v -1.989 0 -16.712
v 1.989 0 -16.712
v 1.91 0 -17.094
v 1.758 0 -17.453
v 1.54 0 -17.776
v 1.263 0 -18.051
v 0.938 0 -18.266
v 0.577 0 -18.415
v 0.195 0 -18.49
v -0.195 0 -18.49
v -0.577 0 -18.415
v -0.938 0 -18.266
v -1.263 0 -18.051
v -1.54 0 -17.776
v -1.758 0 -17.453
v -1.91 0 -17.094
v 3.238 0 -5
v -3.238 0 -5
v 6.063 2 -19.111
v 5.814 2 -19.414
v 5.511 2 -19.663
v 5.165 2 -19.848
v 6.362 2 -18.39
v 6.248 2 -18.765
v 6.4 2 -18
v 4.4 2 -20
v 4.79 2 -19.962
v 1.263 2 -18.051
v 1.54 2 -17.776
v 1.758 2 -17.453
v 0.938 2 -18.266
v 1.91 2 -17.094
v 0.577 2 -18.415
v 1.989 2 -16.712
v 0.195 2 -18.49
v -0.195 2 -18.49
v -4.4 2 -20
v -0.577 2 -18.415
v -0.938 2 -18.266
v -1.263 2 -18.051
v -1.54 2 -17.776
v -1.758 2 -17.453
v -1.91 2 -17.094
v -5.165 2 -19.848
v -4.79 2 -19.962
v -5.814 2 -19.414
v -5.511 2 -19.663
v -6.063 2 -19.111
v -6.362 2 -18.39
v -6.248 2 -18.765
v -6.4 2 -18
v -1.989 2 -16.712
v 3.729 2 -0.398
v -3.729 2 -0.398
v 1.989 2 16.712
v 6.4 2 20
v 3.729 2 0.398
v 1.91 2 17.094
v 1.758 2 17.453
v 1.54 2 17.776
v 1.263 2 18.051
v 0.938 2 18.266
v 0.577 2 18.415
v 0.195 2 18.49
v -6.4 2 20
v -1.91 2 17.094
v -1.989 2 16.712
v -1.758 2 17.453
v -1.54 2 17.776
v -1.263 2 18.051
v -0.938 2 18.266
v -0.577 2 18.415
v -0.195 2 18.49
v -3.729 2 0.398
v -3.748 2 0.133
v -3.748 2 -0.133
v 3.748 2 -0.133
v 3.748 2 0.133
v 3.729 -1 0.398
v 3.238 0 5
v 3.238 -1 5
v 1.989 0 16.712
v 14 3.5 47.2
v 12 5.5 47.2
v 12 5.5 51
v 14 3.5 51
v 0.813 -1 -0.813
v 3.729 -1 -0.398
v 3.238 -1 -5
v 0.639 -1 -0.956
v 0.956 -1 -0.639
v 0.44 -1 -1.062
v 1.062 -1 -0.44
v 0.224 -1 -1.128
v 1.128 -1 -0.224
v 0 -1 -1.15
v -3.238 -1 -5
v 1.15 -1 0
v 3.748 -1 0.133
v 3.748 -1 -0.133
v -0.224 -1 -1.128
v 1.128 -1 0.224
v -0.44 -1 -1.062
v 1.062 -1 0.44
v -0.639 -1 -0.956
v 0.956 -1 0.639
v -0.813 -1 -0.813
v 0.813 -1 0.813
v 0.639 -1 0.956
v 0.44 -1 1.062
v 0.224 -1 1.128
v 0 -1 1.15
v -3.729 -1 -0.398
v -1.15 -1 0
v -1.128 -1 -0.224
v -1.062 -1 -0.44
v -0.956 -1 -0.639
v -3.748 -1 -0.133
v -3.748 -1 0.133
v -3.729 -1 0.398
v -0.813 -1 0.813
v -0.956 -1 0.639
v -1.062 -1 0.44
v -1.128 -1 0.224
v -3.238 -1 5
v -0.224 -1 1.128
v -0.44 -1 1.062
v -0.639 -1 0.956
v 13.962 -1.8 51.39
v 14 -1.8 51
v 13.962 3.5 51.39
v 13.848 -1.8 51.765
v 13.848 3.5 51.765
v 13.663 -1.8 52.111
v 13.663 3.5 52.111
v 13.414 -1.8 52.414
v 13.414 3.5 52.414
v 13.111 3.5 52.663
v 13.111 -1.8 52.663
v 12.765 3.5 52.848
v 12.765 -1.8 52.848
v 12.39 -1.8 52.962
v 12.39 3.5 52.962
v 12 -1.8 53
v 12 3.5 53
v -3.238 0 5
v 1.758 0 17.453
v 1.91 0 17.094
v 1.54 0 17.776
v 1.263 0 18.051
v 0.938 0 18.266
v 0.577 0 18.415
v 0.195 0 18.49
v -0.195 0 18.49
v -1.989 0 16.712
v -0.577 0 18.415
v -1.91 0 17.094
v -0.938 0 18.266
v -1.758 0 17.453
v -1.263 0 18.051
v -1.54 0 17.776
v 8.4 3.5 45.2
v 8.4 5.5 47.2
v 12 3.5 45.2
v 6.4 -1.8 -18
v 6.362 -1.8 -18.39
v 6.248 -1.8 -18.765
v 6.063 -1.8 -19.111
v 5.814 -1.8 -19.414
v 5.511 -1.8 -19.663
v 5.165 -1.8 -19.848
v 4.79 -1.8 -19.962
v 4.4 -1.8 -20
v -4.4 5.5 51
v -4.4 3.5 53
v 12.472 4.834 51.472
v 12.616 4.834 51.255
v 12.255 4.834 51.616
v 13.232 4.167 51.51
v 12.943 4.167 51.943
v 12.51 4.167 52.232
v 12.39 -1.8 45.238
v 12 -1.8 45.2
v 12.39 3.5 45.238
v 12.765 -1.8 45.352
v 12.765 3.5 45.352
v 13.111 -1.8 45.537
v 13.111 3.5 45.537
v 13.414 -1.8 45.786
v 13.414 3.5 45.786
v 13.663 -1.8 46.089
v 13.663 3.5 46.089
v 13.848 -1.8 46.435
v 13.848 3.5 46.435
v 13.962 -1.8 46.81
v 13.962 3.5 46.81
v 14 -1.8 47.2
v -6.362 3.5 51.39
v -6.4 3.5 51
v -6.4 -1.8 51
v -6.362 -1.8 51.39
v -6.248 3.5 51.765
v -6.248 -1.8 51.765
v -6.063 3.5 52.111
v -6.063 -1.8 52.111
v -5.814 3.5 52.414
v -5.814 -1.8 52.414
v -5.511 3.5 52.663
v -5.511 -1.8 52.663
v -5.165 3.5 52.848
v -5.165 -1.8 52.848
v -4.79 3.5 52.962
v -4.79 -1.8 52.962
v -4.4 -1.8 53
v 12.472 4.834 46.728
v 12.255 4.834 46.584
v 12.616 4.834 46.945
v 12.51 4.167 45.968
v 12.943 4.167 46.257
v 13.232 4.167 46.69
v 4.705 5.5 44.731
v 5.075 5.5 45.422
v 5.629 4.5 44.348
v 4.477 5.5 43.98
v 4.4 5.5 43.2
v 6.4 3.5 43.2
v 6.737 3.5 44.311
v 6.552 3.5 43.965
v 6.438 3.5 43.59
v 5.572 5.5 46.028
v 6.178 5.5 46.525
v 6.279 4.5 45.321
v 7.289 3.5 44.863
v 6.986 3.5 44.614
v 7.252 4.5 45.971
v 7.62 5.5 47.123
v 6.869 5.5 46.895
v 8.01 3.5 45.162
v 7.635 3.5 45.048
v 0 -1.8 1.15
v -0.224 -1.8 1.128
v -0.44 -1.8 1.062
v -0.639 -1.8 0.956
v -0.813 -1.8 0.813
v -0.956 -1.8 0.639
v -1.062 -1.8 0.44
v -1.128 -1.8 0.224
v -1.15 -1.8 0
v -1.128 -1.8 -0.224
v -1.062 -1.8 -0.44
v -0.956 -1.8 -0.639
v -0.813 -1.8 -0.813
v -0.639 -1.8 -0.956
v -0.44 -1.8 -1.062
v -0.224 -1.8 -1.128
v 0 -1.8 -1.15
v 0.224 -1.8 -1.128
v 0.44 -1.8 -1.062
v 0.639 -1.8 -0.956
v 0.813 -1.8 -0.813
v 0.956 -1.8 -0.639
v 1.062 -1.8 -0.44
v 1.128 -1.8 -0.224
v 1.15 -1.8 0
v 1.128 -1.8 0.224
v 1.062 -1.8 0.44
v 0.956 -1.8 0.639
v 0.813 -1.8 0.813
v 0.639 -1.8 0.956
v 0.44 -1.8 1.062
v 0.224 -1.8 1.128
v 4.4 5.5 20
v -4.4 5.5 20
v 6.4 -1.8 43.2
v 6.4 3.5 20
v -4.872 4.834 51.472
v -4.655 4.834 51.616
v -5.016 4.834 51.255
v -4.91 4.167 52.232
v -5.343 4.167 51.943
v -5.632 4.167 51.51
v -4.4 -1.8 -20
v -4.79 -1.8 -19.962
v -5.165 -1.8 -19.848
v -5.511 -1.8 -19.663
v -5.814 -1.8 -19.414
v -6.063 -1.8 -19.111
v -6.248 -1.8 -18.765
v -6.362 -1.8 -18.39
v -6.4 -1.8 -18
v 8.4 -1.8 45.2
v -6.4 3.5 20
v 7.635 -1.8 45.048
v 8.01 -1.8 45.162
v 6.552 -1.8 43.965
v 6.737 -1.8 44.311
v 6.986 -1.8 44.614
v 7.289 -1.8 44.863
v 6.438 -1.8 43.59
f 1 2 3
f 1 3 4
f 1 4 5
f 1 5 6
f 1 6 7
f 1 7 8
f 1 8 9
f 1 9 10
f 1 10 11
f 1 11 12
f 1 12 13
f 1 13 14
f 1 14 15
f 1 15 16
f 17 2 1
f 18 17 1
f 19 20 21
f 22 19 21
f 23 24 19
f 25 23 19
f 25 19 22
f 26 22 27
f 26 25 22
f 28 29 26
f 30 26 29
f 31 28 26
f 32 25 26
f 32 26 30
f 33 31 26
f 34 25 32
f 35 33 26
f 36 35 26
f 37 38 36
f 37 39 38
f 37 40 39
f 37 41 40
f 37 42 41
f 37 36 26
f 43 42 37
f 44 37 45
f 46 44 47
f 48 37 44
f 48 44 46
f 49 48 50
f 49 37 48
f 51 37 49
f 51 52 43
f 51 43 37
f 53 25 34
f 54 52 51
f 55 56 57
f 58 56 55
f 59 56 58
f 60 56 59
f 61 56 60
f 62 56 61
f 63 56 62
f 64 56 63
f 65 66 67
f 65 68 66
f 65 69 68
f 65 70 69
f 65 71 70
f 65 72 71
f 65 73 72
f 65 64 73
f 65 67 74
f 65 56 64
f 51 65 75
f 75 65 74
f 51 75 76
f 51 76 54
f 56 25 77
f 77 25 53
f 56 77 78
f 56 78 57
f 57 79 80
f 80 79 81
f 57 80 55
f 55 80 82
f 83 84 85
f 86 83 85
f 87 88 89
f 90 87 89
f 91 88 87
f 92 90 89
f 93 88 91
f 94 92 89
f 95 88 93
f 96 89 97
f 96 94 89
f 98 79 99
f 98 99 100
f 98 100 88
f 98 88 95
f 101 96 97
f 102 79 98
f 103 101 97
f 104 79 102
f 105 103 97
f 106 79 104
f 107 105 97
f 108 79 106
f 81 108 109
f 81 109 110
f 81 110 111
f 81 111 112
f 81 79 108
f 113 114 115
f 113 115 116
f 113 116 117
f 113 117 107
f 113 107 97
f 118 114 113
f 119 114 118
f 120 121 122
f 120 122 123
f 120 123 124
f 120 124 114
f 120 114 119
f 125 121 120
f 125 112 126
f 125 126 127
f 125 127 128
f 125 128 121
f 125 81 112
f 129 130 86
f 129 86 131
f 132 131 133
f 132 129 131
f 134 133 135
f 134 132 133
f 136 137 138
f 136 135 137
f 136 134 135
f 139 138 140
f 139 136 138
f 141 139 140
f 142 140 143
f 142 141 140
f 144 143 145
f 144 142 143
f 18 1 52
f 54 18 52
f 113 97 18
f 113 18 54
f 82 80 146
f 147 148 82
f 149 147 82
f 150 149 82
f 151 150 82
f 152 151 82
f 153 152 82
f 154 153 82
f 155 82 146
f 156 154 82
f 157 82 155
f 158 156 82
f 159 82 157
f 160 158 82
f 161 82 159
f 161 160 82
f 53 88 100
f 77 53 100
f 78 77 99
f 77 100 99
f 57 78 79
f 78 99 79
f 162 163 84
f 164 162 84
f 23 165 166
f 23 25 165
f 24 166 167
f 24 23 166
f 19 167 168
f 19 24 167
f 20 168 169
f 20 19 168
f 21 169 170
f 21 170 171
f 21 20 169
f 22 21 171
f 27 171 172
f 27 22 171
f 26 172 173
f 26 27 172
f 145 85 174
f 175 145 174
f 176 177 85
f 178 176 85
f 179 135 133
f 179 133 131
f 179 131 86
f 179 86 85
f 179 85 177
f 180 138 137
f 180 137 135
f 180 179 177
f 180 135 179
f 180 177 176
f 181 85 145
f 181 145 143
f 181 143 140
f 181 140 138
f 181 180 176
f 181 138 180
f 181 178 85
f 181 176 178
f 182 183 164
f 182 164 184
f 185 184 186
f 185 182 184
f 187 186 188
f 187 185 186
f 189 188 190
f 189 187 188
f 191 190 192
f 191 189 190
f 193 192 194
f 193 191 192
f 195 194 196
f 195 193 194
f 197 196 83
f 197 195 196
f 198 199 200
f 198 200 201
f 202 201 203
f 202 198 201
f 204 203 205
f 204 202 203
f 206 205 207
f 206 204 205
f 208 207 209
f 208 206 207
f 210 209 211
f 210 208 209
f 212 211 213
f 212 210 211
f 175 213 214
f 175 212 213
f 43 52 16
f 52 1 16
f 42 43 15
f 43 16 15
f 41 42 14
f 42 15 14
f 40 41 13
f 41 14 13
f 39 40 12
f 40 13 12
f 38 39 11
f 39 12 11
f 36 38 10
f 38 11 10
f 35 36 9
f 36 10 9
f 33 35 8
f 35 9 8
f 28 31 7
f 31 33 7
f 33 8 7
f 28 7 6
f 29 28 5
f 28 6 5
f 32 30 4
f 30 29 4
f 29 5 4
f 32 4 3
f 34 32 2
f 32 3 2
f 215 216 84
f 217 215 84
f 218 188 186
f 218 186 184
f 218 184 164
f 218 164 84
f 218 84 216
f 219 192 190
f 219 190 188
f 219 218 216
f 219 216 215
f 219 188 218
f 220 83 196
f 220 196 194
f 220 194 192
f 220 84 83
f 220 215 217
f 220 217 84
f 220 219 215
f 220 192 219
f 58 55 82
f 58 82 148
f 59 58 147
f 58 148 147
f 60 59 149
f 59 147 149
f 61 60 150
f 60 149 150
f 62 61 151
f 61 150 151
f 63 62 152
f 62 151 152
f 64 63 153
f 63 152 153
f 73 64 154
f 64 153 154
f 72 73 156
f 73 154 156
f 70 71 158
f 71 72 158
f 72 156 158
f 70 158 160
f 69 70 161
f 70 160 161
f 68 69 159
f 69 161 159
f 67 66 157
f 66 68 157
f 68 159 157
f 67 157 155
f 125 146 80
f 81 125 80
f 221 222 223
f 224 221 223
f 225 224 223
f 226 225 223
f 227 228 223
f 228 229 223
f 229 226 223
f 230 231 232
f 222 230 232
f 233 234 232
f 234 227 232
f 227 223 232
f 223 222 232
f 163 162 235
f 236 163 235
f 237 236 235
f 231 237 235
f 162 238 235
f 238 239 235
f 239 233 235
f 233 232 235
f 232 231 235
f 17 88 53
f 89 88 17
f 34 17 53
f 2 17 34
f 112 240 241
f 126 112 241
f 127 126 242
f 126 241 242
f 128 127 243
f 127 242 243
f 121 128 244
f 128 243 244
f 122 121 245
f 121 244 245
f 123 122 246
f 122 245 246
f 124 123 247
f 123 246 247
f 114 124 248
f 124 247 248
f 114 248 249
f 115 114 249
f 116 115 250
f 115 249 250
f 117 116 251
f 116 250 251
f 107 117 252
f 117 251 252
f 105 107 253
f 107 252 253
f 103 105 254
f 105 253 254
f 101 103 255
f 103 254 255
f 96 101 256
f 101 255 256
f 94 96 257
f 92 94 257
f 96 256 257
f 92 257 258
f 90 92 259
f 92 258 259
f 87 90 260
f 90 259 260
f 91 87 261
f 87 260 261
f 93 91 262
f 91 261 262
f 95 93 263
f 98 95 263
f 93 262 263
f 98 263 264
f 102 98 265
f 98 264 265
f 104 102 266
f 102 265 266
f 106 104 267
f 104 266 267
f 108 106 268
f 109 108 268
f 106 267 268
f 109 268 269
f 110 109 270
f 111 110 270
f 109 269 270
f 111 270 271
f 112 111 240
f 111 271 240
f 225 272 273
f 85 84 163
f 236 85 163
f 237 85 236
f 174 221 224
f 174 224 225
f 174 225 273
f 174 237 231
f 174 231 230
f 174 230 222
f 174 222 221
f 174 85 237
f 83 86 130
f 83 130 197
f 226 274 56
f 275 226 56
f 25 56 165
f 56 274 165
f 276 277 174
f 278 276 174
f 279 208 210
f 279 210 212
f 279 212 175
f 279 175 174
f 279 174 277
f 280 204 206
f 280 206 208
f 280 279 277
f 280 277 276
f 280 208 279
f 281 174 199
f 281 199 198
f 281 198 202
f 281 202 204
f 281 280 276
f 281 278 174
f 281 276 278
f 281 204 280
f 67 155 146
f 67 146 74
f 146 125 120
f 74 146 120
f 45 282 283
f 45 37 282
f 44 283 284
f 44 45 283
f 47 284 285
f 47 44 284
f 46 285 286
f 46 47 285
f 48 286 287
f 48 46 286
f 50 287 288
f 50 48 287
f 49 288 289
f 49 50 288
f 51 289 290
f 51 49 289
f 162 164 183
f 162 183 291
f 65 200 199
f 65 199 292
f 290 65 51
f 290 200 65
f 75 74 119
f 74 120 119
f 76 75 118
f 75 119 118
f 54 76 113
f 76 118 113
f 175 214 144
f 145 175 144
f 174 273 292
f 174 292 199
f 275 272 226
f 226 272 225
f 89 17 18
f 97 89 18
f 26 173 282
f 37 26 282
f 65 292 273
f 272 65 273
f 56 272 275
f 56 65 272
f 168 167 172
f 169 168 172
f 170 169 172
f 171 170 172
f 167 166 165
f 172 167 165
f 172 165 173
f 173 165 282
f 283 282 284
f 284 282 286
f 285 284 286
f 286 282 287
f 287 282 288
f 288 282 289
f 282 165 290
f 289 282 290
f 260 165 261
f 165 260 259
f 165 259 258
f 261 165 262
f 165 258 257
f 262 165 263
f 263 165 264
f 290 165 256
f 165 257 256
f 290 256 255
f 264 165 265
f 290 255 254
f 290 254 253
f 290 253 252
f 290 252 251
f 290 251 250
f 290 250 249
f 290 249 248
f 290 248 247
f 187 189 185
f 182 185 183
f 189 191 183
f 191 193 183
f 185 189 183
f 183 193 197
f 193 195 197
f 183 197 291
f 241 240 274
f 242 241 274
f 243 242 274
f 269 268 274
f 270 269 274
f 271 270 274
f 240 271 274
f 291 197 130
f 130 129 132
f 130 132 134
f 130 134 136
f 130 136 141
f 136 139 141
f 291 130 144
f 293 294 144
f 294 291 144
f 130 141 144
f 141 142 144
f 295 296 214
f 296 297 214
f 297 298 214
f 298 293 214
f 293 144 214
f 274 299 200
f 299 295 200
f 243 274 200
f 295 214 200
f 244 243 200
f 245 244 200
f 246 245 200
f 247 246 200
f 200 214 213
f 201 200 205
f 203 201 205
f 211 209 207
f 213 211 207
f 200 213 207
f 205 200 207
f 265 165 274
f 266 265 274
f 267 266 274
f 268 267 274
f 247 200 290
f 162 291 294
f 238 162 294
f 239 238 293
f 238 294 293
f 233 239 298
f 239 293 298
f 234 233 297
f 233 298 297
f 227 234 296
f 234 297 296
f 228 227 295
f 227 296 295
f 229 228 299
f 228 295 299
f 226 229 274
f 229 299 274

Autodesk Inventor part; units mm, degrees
ref_plane "YZ Plane" through (0, 0, 0) normal (1, 0, 0) x (0, 1, 0)
ref_plane "XZ Plane" through (0, 0, 0) normal (0, 1, 0) x (-1, 0, 0)
ref_plane "XY Plane" through (0, 0, 0) normal (0, 0, 1) x (1, 0, 0)
sketch "Sketch1" plane through (0, 0, 0) normal (0, 1, 0) x (-1, 0, 0)
  circle A0 centre (0, 0) radius 3.75
  circle A1 centre (0, 16.5) radius 2
  line L0 (0, 16.5) -> (0, 0) construction
  line L1 (1.9887, 16.7121) -> (3.7288, 0.3977)
  line L2 (-3.7288, 0.3977) -> (-1.9887, 16.7121)
  line L3 (0, 16.5) -> (0, 18.5) construction
  line L4 (0, 0) -> (3.75, 0) construction
  circle A2 centre (0, -16.5) radius 2
  line L5 (0, -16.5) -> (0, -18.5) construction
  line L6 (1.9887, -16.7121) -> (3.7288, -0.3977)
  line L7 (0, -16.5) -> (0, 0) construction
  line L8 (-3.7288, -0.3977) -> (-1.9887, -16.7121)
  line L9 (3.238, 5) -> (-3.238, 5)
  line L10 (-3.238, -5) -> (3.238, -5)
  line L11 (-6.4, -20) -> (6.4, -20)
  line L12 (6.4, -20) -> (6.4, 20)
  line L13 (6.4, 20) -> (-6.4, 20)
  line L14 (-6.4, 20) -> (-6.4, -20)
  line L15 (-6.4, -20) -> (6.4, 20) construction
  line L16 (6.4, -20) -> (-6.4, 20) construction
  line L17 (6.4, 53) -> (-14, 53)
  line L18 (-14, 53) -> (-14, 45.2)
  line L19 (-14, 45.2) -> (-6.4, 45.2)
  line L20 (-6.4, 45.2) -> (-6.4, 20)
  line L21 (6.4, 53) -> (6.4, 20)
  line L22 (0, 20) -> (0, 53) construction
  point P0 (-3.7288, -0.3977)
  point P1 (3.7288, -0.3977)
  dimension "d0" = 4
  dimension "d1" = 7.5
  dimension "d2" = 18.5
  dimension "d3" = 5
  dimension "d4" = 5
  dimension "d7" = 12.8
  dimension "d8" = 40
  dimension "d9" = 6.4
  dimension "d10" = 6.4
  dimension "d11" = 53
  dimension "d12" = 14
  dimension "d13" = 7.8
extrude "Extrusion1" add sketch "Sketch1" against normal blind 1.8 contours A0 | A0 L2 L9 L1 | L6 L10 L8 A0 | L9 L2 A1 L1 | L6 A2 L8 L10 | A1 | A2 | L14 L13 L12 L11 | L20 L19 L18 L17 L21 L13
extrude "Extrusion2" add sketch "Sketch1" along normal blind 2 contours L14 L13 L12 L11
hole "Hole2" at (0, 0, 0) direction (0, -1, 0) diameter 2.3 end through all
extrude "Extrusion3" cut sketch "Sketch1" against normal blind 1 contours A0 | A0 L2 L9 L1 | L6 L10 L8 A0
extrude "Extrusion4" add sketch "Sketch1" along normal blind 5.5 contours L20 L19 L18 L17 L21 L13
fillet "Fillet1" radius 2 6 edges at (6.4, 1.85, 45.2) (14, 1.85, 45.2) (14, 1.85, 53) (-6.4, 1.85, 53) (6.4, 0.1, -20) (-6.4, 0.1, -20)
chamfer "Chamfer1" distance 2 angle 45 8 edges at (6.4, 5.5, 31.6) (10.2, 5.5, 45.2) (13.4142, 5.5, 45.7858) (14, 5.5, 49.1) (13.4142, 5.5, 52.4142) (3.8, 5.5, 53) (-5.8142, 5.5, 52.4142) (-6.4, 5.5, 35.5)
equation "\"d4\" = d3"
equation "\"d7\" = 2 * d9"
equation "\"d10\" = d9"
properties part number "arm2_3DPrint"
